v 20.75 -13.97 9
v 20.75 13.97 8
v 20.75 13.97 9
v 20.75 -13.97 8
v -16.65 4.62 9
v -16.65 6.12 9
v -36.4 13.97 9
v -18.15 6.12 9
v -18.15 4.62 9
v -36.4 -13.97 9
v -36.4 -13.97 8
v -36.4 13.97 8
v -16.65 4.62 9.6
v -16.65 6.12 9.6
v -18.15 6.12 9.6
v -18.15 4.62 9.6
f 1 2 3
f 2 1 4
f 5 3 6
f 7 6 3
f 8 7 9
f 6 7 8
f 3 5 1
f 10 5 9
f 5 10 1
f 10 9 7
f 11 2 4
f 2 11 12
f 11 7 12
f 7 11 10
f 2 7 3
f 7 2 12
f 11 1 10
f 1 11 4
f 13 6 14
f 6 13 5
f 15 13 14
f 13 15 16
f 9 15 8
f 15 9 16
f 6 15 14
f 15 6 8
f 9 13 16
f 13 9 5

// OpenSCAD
// file: ../../screw-post/screw-post.scad
//-----------------------------------------------------------------------
// Screw post: a round post off the floor that a board screws down onto
//
// Two ways to fix:
//   "nut"  clearance hole through the post and floor; the nut sits in a hex
//          trap in the floor's underside, so the screw goes in from the top
//   "tap"  a pilot hole the screw cuts its own thread in (one or two fittings
//          in PLA/PETG); blind, the floor stays whole underneath
// and "head" for a screw up from below (head in a counterbore, nut on top).
//
// Modules, all in the same frame:
//   screwPostGhost()     the screw (and nut), for previews
//   screwPost()          the post: add to the floor
//   screwPostFloorCut()  subtract from the floor: nut trap / counterbore and hole
//
// Frame: origin on the floor top, on the post's axis. Z up; the floor is
// Z = -floorThick .. 0. Units: mm.
//
// Sizes: "M2", "M2.5", "M3". screwPostScrew(size, ...) says which screw length
// reaches, so a project can assert it has that screw in the kit.
//-----------------------------------------------------------------------

//-- [name, screw Ø, nut across flats, nut thick, head Ø, head height, tap hole, post Ø]
//-- Nuts ISO 4032; heads ISO 7380 button. Tap holes: the usual ~0.8 x Ø for plastic
screwSizes = [
  ["M2",   2.0, 4.0, 1.6, 3.5, 1.1, 1.6, 5.0],
  ["M2.5", 2.5, 5.0, 2.0, 4.4, 1.4, 2.1, 6.0],    // head 4.4: measured on the kit's M2.5 (controller base)
  ["M3",   3.0, 5.5, 2.4, 5.7, 1.65, 2.5, 7.0],
];

screwHoleClear = 0.4;     // added to the screw Ø for a clearance hole
screwNutClear  = 0.3;     // CAL: across flats, nut trap over the nut. Set by the fit piece
screwTapClear  = 0.0;     // CAL: added to the tap hole. Set by the fit piece
screwHeadClear = 0.6;     // counterbore over the head Ø

function screwSize(size) = let (i = search([size], screwSizes)[0])
  assert(i != [] && i != undef, str("unknown screw size ", size)) screwSizes[i];
function screwDia(size)    = screwSize(size)[1];
function screwNutAF(size)  = screwSize(size)[2];
function screwNutH(size)   = screwSize(size)[3];
function screwHeadDia(size)= screwSize(size)[4];
function screwHeadH(size)  = screwSize(size)[5];
function screwPostDia(size)= screwSize(size)[7];

//-- Shortest screw that fills the nut, from the top of the clamped part (h + clamp
//-- above the floor) down to the nut trap's underside. Round up to a length you have.
function screwPostScrew(size, h, floorThick, clamp = 1.6) = h + clamp + floorThick;

module screwPostGhost(size, h, floorThick, clamp = 1.6, length, how = "nut")
{
  d = screwDia(size);
  L = is_undef(length) ? screwPostScrew(size, h, floorThick, clamp) : length;
  top = h + clamp;
  if (how == "head")
  {
    %color("Silver") translate([0, 0, -floorThick]) cylinder(d = screwHeadDia(size), h = screwHeadH(size), $fn = 24);
    %color("Silver") translate([0, 0, -floorThick + screwHeadH(size)]) cylinder(d = d, h = L, $fn = 16);
  }
  else
  {
    %color("Silver") translate([0, 0, top]) cylinder(d = screwHeadDia(size), h = screwHeadH(size), $fn = 24);
    %color("Silver") translate([0, 0, top - L]) cylinder(d = d, h = L, $fn = 16);
    if (how == "nut")
      %color("DimGray") translate([0, 0, -floorThick]) rotate([0, 0, 30]) cylinder(d = screwNutAF(size)/cos(30), h = screwNutH(size), $fn = 6);
  }
}

//-- how: "nut" | "head" (through hole) or "tap" (blind pilot hole). postDia defaults by size
module screwPost(size, h, how = "nut", postDia, tapClear = screwTapClear)
{
  pd = is_undef(postDia) ? screwPostDia(size) : postDia;
  hole = how == "tap" ? screwSize(size)[6] + tapClear : screwDia(size) + screwHoleClear;
  difference()
  {
    translate([0, 0, -0.01]) cylinder(d = pd, h = h + 0.01, $fn = 40);
    translate([0, 0, how == "tap" ? 0.6 : -1]) cylinder(d = hole, h = h + 2, $fn = 24);
    //-- lead-in so the screw starts square
    translate([0, 0, h - 0.4]) cylinder(d1 = hole, d2 = hole + 0.8, h = 0.41, $fn = 24);
  }
}

//-- "nut": hex trap from the underside, opening a little over the nut so it sits flush.
//-- "head": counterbore for the head. "tap": nothing.
module screwPostFloorCut(size, floorThick, how = "nut", nutClear = screwNutClear)
{
  d = screwDia(size) + screwHoleClear;
  if (how == "nut")
  {
    af = screwNutAF(size) + nutClear;
    translate([0, 0, -floorThick - 1]) rotate([0, 0, 30]) cylinder(d = af/cos(30), h = screwNutH(size) + 0.1 + 1, $fn = 6);
    translate([0, 0, -floorThick - 1]) cylinder(d = d + 0.4, h = floorThick + 2, $fn = 24);
  }
  if (how == "head")
  {
    translate([0, 0, -floorThick - 1]) cylinder(d = screwHeadDia(size) + screwHeadClear, h = screwHeadH(size) + 0.2 + 1, $fn = 32);
    translate([0, 0, -floorThick - 1]) cylinder(d = d + 0.4, h = floorThick + 2, $fn = 24);
  }
  assert(how == "tap" || floorThick >= (how == "nut" ? screwNutH(size) : screwHeadH(size)) + 0.1 + 0.3,
         str("floor too thin for the ", size, " ", how));
}
// file: ../../usb-c-port/usb-c-port.scad
//-----------------------------------------------------------------------
// USB-C port through a wall, flush: the socket's metal shell sits in a
// close-fitting pocket in the wall, walled in on all four sides, its face
// level with the outside. The cable seats the way it does on a laptop.
//
// A board's socket only overhangs the board edge by a mm or so, less than
// the wall. So the board's end tucks into a shallow relief in the wall's
// inner face, the width of the board, leaving the wall round the socket
// thin enough for the face to reach the outside. When that would leave less
// than usbcMinWall (a socket that barely overhangs), the face sits back from
// the outside instead: usbcRecess() says how far.
//
// Modules, all in the same frame:
//   usbcGhost()     the socket and the board's end, for previews
//   usbcWallCut()   subtract from the wall: socket pocket and board relief
//
// Frame: origin on the floor top at the wall's inner face, under the socket's
// axis. +X into the box, Z up. The wall is X = -wall .. 0. The board is
// component side up, socket on top (top-mount, as on the FireBeetle, C3 Super
// Mini and S3 DevKitC). Units: mm.
//
// usbcBoardEdgeX() gives where the board's edge lands (negative: inside the
// wall), so a holder can put its posts or pocket to match.
//-----------------------------------------------------------------------

//-- The socket: USB-C receptacle shell (USB-IF 8.34 x 2.56 plug, receptacle shell ~8.94 x 3.26)
usbcShellW     = 8.94;
usbcShellH     = 3.26;    // CAL per board: measured 3.2 on the FireBeetle
usbcShellR     = 1.2;     // CAL: end radius. Full round would be 1.63; most shells are squarer
usbcShellDepth = 7.35;    // face to back

//-- The pocket
usbcClearance  = 0.15;    // CAL: per side, shell to pocket. Set by the fit piece
usbcMinWall    = 1.0;     // thinnest wall left round the socket
usbcReliefGap  = 0.3;     // board relief over the board, each side and above/below
usbcChamfer    = 0.3;     // lead-in on the outside edge

//-- How far the socket face sits back from the outside: 0 (flush) unless the socket
//-- overhangs the board edge by less than usbcMinWall
function usbcRecess(overhang, minWall = usbcMinWall) = max(0, minWall - overhang);
//-- X of the board's socket edge in this frame
function usbcBoardEdgeX(wall, overhang, recess) =
  -wall + (is_undef(recess) ? usbcRecess(overhang) : recess) + overhang;
//-- Z of the board's underside above the floor top
function usbcBoardZ(axisZ, pcb, shellH = usbcShellH) = axisZ - shellH/2 - pcb;

module usbcShell2D(grow = 0, w = usbcShellW, h = usbcShellH, r = usbcShellR)
{
  offset(r = r + grow, $fn = 24) square([w - 2*r, h - 2*r], center = true);
}

//-- axisZ: socket axis above the floor. boardW/pcb: the board, for the ghost and relief.
//-- shift: socket centre across the board's width from the board's centre line (+Y)
module usbcGhost(axisZ, wall, overhang, boardW, pcb = 1.6, recess, shift = 0, shellH = usbcShellH, shellW = usbcShellW)
{
  ex = usbcBoardEdgeX(wall, overhang, recess);
  %color("Silver") translate([ex - overhang, 0, axisZ]) rotate([0, 90, 0]) rotate([0, 0, 90])
    linear_extrude(usbcShellDepth) usbcShell2D(w = shellW, h = shellH);
  %color("DarkSlateGray") translate([ex, -boardW/2 - shift, usbcBoardZ(axisZ, pcb, shellH)]) cube([12, boardW, pcb]);
}

module usbcWallCut(axisZ, wall, overhang, boardW, pcb = 1.6, recess, shift = 0,
                   clearance = usbcClearance, shellH = usbcShellH, shellW = usbcShellW, aboveBoard)
{
  rc = is_undef(recess) ? usbcRecess(overhang) : recess;
  ex = usbcBoardEdgeX(wall, overhang, rc);
  bz = usbcBoardZ(axisZ, pcb, shellH);
  //-- what stands on the board near its edge: the socket, unless told taller
  up = is_undef(aboveBoard) ? shellH : aboveBoard;
  assert(ex - overhang + wall >= -0.01, "socket face would stand proud of the wall");
  assert(rc > 0 || overhang >= usbcMinWall - 0.01, "wall round the socket under usbcMinWall");
  //-- socket pocket, through the wall
  translate([-wall - 1, 0, axisZ]) rotate([0, 90, 0]) rotate([0, 0, 90])
    linear_extrude(wall + 2) usbcShell2D(clearance, w = shellW, h = shellH);
  //-- lead-in chamfer on the outside
  translate([-wall, 0, axisZ]) rotate([0, 90, 0]) rotate([0, 0, 90])
    hull()
    {
      translate([0, 0, -0.01]) linear_extrude(0.01) usbcShell2D(clearance + usbcChamfer, w = shellW, h = shellH);
      translate([0, 0, usbcChamfer]) linear_extrude(0.01) usbcShell2D(clearance, w = shellW, h = shellH);
    }
  //-- board relief in the inner face, when the board's edge lands inside the wall
  if (ex < 0)
    translate([ex - usbcReliefGap, -boardW/2 - shift - usbcReliefGap, bz - usbcReliefGap])
      cube([-ex + usbcReliefGap + 1, boardW + 2*usbcReliefGap, pcb + up + 2*usbcReliefGap]);
}
// file: ../../board-pocket/board-pocket.scad
//-----------------------------------------------------------------------
// Board pocket: holds a board that has no mounting holes
//
// The board sits on a central pedestal with a pad of double-sided foam tape
// on top, inside a low wall that follows its outline. The pedestal keeps
// the board's edges off the floor, so lead stubs soldered through the edge
// holes have room underneath; gaps in the wall let the leads out. The wall
// only locates the board: the tape holds it down, and in a closed box a lid
// pad presses a pad of foam onto it (boardLidPad below).
//
// Modules, all in the same frame:
//   boardPocketGhost()   the board and its tape, for previews
//   boardPocketHolder()  the plastic: pedestal and outline wall, add to the floor
//   boardLidPad()        a block hanging from the lid that presses foam onto the board
//   boardLidPadGhost()   the foam under it, squashed, for previews
//
// Frame: origin on the floor top, under the centre of the board's outline.
// X along the board's length l, Y across its width w, Z up. Units: mm.
//
// Sides are listed [-X, +X, -Y, +Y], each one of
//   "gap"    wall with a gap in the middle for leads (gapW wide)
//   "solid"  whole wall: use it where the board takes a push (a plug)
//   "open"   no wall: the board's edge goes into a box wall (a USB port)
//
// Used by esp32-c3-supermini, esp32-s3-devkitc and rs485-max485.
//-----------------------------------------------------------------------

//-- From the controller project's receiver.scad / rack-end.scad (boardPocket), 2026-10-30
bpPedestal  = 2.5;     // floor to the tape: room for lead stubs under the board edges
bpTape      = 1.0;     // double-sided foam tape on the pedestal. CAL: how far it squashes
bpWall      = 1.2;     // outline wall thickness
bpRise      = 1.0;     // wall top above the PCB underside (the controller project's rack-end: 0.8 under the S3's module)
bpClearance = 0.4;     // per side, board outline to wall: PETG. 0.3 for PLA. Set by the fit piece
bpGapW      = 6;       // lead gap in a "gap" side
bpPadInset  = 4;       // default pedestal: the board less this all round

//-- Lid hold-down (the controller project's receiver / rack-end lid pads)
bpFoam      = 3.0;     // CAL: self-adhesive foam stuck under each lid pad
bpSqueeze   = 1.0;     // how far the lid squashes it: ~1/3 for soft foam, 0.3 for felt

//-- PCB underside above the floor top
function boardPocketZ(pedestal = bpPedestal, tape = bpTape) = pedestal + tape;
//-- default pedestal [l, w] for a board
function boardPocketPad(l, w, inset = bpPadInset) = [max(l - 2*inset, 4), max(w - 2*inset, 4)];
//-- Z of a lid pad's underside, pressing on a surface at surfaceZ (board top, or a part on it)
function boardLidPadZ(surfaceZ, foam = bpFoam, squeeze = bpSqueeze) =
  assert(squeeze > 0 && squeeze < foam, "foam would not touch the board")
  surfaceZ + foam - squeeze;

function bpSides4(s) = is_list(s) ? s : [s, s, s, s];

module boardPocketGhost(l, w, pcb = 1.6, pad, pedestal = bpPedestal, tape = bpTape)
{
  p = is_undef(pad) ? boardPocketPad(l, w) : pad;
  %color("White") translate([-p[0]/2, -p[1]/2, pedestal]) cube([p[0], p[1], tape]);
  %color("DarkGreen") translate([-l/2, -w/2, pedestal + tape]) cube([l, w, pcb]);
}

//-- pad: pedestal [l, w]; gapW a number or one per side
module boardPocketHolder(l, w, pad, sides = "gap", gapW = bpGapW, clearance = bpClearance,
                         pedestal = bpPedestal, tape = bpTape, wall = bpWall, rise = bpRise)
{
  p   = is_undef(pad) ? boardPocketPad(l, w) : pad;
  s   = bpSides4(sides);
  g   = bpSides4(gapW);
  ix  = l/2 + clearance;                 // inner half sizes
  iy  = w/2 + clearance;
  top = pedestal + tape + rise;
  assert(p[0] <= l && p[1] <= w, "pedestal bigger than the board");
  for (k = s) assert(k == "gap" || k == "solid" || k == "open", str("unknown side ", k));

  //-- pedestal, centred under the board
  translate([-p[0]/2, -p[1]/2, -0.01]) cube([p[0], p[1], pedestal + 0.01]);
  //-- outline wall
  difference()
  {
    translate([-ix - wall, -iy - wall, -0.01]) cube([2*(ix + wall), 2*(iy + wall), top + 0.01]);
    translate([-ix, -iy, -1]) cube([2*ix, 2*iy, top + 2]);
    for (i = [0 : 3])
    {
      //-- each side's cut, drawn for -X then turned into place
      ax = (i < 2) ? ix : iy;         // inner half size across the side
      al = (i < 2) ? iy : ix;         // half length along it
      rotate([0, 0, [0, 180, 90, 270][i]])   // -X, +X, -Y, +Y
      {
        if (s[i] == "gap")
          translate([-ax - wall - 1, -g[i]/2, -1]) cube([wall + 2, g[i], top + 2]);
        if (s[i] == "open")
          translate([-ax - wall - 1, -al - wall - 1, -1]) cube([wall + 1.01, 2*(al + wall + 1), top + 2]);
      }
    }
  }
}

//-- A lid pad over the rectangle size [x, y] centred at `at`, from the squashed foam up to
//-- lidZ (the lid's inner face in this frame), running `into` up into the lid plate
module boardLidPad(size, at = [0, 0], surfaceZ, lidZ, foam = bpFoam, squeeze = bpSqueeze, into = 0.5)
{
  z0 = boardLidPadZ(surfaceZ, foam, squeeze);
  assert(lidZ > z0, "lid is below the pad: the box is too low for the foam");
  translate([at[0] - size[0]/2, at[1] - size[1]/2, z0]) cube([size[0], size[1], lidZ - z0 + into]);
}

module boardLidPadGhost(size, at = [0, 0], surfaceZ, foam = bpFoam, squeeze = bpSqueeze)
{
  %color("Gray") translate([at[0] - size[0]/2, at[1] - size[1]/2, surfaceZ]) cube([size[0], size[1], foam - squeeze]);
}
// main file
// The board as solids, seated on its carrier, in the carrier frame, for the catalogue and the
// collision check (the Ghost is % so it never renders). part = "board" (PCB, LED) | "metal"
// (module shield, both USB shells) | "pins" (header bodies and pins, which point down).
include <../esp32-s3-devkitc.scad>

part = "board";

v   = s3Devkit();
wx  = s3CarrierWallX();
py  = s3CarrierPortY();
ex  = s3DevkitEdgeX(s3CarrierWall);
bz  = boardPocketZ(s3CarrierPedestal, s3CarrierTape);   // the PCB's underside above the plate
top = bz + v[3];
ly  = s3DevkitLeftY();                                    // the board's left edge, holder frame
cy  = ly - v[2]/2;                                        // its centre line

translate([wx, py, 0])
{
  if (part == "board")
  {
    translate([ex, ly - v[2], bz]) cube([v[1], v[2], v[3]]);
    translate([ex + v[9][0] - 0.75, ly - v[9][1] - 0.75, top - 0.01]) cube([1.5, 1.5, 0.61]);
  }
  if (part == "metal")
  {
    translate([ex + v[1] + v[8] - s3ModuleL, cy - s3ModuleW/2, top]) cube([s3ModuleL, s3ModuleW, s3ModuleH]);
    for (c = v[5])
      translate([ex - v[6], ly - c, top + v[7][1]/2]) rotate([0, 90, 0]) rotate([0, 0, 90])
        linear_extrude(s3ShellDepth) s3Shell2D(v);
  }
  if (part == "pins")
    for (r = [-1, 1])
    {
      translate([ex + s3PinFromEnd - s3PinPitch/2, cy + r*v[10]/2 - s3PinPitch/2, bz - s3HeaderBody])
        cube([s3PinN*s3PinPitch, s3PinPitch, s3HeaderBody]);
      for (i = [0 : s3PinN - 1])
        translate([ex + s3PinFromEnd + i*s3PinPitch - s3PinSq/2, cy + r*v[10]/2 - s3PinSq/2, bz - s3PinBelow])
          cube([s3PinSq, s3PinSq, s3PinBelow + v[3] + s3PinAbove]);
    }
}
